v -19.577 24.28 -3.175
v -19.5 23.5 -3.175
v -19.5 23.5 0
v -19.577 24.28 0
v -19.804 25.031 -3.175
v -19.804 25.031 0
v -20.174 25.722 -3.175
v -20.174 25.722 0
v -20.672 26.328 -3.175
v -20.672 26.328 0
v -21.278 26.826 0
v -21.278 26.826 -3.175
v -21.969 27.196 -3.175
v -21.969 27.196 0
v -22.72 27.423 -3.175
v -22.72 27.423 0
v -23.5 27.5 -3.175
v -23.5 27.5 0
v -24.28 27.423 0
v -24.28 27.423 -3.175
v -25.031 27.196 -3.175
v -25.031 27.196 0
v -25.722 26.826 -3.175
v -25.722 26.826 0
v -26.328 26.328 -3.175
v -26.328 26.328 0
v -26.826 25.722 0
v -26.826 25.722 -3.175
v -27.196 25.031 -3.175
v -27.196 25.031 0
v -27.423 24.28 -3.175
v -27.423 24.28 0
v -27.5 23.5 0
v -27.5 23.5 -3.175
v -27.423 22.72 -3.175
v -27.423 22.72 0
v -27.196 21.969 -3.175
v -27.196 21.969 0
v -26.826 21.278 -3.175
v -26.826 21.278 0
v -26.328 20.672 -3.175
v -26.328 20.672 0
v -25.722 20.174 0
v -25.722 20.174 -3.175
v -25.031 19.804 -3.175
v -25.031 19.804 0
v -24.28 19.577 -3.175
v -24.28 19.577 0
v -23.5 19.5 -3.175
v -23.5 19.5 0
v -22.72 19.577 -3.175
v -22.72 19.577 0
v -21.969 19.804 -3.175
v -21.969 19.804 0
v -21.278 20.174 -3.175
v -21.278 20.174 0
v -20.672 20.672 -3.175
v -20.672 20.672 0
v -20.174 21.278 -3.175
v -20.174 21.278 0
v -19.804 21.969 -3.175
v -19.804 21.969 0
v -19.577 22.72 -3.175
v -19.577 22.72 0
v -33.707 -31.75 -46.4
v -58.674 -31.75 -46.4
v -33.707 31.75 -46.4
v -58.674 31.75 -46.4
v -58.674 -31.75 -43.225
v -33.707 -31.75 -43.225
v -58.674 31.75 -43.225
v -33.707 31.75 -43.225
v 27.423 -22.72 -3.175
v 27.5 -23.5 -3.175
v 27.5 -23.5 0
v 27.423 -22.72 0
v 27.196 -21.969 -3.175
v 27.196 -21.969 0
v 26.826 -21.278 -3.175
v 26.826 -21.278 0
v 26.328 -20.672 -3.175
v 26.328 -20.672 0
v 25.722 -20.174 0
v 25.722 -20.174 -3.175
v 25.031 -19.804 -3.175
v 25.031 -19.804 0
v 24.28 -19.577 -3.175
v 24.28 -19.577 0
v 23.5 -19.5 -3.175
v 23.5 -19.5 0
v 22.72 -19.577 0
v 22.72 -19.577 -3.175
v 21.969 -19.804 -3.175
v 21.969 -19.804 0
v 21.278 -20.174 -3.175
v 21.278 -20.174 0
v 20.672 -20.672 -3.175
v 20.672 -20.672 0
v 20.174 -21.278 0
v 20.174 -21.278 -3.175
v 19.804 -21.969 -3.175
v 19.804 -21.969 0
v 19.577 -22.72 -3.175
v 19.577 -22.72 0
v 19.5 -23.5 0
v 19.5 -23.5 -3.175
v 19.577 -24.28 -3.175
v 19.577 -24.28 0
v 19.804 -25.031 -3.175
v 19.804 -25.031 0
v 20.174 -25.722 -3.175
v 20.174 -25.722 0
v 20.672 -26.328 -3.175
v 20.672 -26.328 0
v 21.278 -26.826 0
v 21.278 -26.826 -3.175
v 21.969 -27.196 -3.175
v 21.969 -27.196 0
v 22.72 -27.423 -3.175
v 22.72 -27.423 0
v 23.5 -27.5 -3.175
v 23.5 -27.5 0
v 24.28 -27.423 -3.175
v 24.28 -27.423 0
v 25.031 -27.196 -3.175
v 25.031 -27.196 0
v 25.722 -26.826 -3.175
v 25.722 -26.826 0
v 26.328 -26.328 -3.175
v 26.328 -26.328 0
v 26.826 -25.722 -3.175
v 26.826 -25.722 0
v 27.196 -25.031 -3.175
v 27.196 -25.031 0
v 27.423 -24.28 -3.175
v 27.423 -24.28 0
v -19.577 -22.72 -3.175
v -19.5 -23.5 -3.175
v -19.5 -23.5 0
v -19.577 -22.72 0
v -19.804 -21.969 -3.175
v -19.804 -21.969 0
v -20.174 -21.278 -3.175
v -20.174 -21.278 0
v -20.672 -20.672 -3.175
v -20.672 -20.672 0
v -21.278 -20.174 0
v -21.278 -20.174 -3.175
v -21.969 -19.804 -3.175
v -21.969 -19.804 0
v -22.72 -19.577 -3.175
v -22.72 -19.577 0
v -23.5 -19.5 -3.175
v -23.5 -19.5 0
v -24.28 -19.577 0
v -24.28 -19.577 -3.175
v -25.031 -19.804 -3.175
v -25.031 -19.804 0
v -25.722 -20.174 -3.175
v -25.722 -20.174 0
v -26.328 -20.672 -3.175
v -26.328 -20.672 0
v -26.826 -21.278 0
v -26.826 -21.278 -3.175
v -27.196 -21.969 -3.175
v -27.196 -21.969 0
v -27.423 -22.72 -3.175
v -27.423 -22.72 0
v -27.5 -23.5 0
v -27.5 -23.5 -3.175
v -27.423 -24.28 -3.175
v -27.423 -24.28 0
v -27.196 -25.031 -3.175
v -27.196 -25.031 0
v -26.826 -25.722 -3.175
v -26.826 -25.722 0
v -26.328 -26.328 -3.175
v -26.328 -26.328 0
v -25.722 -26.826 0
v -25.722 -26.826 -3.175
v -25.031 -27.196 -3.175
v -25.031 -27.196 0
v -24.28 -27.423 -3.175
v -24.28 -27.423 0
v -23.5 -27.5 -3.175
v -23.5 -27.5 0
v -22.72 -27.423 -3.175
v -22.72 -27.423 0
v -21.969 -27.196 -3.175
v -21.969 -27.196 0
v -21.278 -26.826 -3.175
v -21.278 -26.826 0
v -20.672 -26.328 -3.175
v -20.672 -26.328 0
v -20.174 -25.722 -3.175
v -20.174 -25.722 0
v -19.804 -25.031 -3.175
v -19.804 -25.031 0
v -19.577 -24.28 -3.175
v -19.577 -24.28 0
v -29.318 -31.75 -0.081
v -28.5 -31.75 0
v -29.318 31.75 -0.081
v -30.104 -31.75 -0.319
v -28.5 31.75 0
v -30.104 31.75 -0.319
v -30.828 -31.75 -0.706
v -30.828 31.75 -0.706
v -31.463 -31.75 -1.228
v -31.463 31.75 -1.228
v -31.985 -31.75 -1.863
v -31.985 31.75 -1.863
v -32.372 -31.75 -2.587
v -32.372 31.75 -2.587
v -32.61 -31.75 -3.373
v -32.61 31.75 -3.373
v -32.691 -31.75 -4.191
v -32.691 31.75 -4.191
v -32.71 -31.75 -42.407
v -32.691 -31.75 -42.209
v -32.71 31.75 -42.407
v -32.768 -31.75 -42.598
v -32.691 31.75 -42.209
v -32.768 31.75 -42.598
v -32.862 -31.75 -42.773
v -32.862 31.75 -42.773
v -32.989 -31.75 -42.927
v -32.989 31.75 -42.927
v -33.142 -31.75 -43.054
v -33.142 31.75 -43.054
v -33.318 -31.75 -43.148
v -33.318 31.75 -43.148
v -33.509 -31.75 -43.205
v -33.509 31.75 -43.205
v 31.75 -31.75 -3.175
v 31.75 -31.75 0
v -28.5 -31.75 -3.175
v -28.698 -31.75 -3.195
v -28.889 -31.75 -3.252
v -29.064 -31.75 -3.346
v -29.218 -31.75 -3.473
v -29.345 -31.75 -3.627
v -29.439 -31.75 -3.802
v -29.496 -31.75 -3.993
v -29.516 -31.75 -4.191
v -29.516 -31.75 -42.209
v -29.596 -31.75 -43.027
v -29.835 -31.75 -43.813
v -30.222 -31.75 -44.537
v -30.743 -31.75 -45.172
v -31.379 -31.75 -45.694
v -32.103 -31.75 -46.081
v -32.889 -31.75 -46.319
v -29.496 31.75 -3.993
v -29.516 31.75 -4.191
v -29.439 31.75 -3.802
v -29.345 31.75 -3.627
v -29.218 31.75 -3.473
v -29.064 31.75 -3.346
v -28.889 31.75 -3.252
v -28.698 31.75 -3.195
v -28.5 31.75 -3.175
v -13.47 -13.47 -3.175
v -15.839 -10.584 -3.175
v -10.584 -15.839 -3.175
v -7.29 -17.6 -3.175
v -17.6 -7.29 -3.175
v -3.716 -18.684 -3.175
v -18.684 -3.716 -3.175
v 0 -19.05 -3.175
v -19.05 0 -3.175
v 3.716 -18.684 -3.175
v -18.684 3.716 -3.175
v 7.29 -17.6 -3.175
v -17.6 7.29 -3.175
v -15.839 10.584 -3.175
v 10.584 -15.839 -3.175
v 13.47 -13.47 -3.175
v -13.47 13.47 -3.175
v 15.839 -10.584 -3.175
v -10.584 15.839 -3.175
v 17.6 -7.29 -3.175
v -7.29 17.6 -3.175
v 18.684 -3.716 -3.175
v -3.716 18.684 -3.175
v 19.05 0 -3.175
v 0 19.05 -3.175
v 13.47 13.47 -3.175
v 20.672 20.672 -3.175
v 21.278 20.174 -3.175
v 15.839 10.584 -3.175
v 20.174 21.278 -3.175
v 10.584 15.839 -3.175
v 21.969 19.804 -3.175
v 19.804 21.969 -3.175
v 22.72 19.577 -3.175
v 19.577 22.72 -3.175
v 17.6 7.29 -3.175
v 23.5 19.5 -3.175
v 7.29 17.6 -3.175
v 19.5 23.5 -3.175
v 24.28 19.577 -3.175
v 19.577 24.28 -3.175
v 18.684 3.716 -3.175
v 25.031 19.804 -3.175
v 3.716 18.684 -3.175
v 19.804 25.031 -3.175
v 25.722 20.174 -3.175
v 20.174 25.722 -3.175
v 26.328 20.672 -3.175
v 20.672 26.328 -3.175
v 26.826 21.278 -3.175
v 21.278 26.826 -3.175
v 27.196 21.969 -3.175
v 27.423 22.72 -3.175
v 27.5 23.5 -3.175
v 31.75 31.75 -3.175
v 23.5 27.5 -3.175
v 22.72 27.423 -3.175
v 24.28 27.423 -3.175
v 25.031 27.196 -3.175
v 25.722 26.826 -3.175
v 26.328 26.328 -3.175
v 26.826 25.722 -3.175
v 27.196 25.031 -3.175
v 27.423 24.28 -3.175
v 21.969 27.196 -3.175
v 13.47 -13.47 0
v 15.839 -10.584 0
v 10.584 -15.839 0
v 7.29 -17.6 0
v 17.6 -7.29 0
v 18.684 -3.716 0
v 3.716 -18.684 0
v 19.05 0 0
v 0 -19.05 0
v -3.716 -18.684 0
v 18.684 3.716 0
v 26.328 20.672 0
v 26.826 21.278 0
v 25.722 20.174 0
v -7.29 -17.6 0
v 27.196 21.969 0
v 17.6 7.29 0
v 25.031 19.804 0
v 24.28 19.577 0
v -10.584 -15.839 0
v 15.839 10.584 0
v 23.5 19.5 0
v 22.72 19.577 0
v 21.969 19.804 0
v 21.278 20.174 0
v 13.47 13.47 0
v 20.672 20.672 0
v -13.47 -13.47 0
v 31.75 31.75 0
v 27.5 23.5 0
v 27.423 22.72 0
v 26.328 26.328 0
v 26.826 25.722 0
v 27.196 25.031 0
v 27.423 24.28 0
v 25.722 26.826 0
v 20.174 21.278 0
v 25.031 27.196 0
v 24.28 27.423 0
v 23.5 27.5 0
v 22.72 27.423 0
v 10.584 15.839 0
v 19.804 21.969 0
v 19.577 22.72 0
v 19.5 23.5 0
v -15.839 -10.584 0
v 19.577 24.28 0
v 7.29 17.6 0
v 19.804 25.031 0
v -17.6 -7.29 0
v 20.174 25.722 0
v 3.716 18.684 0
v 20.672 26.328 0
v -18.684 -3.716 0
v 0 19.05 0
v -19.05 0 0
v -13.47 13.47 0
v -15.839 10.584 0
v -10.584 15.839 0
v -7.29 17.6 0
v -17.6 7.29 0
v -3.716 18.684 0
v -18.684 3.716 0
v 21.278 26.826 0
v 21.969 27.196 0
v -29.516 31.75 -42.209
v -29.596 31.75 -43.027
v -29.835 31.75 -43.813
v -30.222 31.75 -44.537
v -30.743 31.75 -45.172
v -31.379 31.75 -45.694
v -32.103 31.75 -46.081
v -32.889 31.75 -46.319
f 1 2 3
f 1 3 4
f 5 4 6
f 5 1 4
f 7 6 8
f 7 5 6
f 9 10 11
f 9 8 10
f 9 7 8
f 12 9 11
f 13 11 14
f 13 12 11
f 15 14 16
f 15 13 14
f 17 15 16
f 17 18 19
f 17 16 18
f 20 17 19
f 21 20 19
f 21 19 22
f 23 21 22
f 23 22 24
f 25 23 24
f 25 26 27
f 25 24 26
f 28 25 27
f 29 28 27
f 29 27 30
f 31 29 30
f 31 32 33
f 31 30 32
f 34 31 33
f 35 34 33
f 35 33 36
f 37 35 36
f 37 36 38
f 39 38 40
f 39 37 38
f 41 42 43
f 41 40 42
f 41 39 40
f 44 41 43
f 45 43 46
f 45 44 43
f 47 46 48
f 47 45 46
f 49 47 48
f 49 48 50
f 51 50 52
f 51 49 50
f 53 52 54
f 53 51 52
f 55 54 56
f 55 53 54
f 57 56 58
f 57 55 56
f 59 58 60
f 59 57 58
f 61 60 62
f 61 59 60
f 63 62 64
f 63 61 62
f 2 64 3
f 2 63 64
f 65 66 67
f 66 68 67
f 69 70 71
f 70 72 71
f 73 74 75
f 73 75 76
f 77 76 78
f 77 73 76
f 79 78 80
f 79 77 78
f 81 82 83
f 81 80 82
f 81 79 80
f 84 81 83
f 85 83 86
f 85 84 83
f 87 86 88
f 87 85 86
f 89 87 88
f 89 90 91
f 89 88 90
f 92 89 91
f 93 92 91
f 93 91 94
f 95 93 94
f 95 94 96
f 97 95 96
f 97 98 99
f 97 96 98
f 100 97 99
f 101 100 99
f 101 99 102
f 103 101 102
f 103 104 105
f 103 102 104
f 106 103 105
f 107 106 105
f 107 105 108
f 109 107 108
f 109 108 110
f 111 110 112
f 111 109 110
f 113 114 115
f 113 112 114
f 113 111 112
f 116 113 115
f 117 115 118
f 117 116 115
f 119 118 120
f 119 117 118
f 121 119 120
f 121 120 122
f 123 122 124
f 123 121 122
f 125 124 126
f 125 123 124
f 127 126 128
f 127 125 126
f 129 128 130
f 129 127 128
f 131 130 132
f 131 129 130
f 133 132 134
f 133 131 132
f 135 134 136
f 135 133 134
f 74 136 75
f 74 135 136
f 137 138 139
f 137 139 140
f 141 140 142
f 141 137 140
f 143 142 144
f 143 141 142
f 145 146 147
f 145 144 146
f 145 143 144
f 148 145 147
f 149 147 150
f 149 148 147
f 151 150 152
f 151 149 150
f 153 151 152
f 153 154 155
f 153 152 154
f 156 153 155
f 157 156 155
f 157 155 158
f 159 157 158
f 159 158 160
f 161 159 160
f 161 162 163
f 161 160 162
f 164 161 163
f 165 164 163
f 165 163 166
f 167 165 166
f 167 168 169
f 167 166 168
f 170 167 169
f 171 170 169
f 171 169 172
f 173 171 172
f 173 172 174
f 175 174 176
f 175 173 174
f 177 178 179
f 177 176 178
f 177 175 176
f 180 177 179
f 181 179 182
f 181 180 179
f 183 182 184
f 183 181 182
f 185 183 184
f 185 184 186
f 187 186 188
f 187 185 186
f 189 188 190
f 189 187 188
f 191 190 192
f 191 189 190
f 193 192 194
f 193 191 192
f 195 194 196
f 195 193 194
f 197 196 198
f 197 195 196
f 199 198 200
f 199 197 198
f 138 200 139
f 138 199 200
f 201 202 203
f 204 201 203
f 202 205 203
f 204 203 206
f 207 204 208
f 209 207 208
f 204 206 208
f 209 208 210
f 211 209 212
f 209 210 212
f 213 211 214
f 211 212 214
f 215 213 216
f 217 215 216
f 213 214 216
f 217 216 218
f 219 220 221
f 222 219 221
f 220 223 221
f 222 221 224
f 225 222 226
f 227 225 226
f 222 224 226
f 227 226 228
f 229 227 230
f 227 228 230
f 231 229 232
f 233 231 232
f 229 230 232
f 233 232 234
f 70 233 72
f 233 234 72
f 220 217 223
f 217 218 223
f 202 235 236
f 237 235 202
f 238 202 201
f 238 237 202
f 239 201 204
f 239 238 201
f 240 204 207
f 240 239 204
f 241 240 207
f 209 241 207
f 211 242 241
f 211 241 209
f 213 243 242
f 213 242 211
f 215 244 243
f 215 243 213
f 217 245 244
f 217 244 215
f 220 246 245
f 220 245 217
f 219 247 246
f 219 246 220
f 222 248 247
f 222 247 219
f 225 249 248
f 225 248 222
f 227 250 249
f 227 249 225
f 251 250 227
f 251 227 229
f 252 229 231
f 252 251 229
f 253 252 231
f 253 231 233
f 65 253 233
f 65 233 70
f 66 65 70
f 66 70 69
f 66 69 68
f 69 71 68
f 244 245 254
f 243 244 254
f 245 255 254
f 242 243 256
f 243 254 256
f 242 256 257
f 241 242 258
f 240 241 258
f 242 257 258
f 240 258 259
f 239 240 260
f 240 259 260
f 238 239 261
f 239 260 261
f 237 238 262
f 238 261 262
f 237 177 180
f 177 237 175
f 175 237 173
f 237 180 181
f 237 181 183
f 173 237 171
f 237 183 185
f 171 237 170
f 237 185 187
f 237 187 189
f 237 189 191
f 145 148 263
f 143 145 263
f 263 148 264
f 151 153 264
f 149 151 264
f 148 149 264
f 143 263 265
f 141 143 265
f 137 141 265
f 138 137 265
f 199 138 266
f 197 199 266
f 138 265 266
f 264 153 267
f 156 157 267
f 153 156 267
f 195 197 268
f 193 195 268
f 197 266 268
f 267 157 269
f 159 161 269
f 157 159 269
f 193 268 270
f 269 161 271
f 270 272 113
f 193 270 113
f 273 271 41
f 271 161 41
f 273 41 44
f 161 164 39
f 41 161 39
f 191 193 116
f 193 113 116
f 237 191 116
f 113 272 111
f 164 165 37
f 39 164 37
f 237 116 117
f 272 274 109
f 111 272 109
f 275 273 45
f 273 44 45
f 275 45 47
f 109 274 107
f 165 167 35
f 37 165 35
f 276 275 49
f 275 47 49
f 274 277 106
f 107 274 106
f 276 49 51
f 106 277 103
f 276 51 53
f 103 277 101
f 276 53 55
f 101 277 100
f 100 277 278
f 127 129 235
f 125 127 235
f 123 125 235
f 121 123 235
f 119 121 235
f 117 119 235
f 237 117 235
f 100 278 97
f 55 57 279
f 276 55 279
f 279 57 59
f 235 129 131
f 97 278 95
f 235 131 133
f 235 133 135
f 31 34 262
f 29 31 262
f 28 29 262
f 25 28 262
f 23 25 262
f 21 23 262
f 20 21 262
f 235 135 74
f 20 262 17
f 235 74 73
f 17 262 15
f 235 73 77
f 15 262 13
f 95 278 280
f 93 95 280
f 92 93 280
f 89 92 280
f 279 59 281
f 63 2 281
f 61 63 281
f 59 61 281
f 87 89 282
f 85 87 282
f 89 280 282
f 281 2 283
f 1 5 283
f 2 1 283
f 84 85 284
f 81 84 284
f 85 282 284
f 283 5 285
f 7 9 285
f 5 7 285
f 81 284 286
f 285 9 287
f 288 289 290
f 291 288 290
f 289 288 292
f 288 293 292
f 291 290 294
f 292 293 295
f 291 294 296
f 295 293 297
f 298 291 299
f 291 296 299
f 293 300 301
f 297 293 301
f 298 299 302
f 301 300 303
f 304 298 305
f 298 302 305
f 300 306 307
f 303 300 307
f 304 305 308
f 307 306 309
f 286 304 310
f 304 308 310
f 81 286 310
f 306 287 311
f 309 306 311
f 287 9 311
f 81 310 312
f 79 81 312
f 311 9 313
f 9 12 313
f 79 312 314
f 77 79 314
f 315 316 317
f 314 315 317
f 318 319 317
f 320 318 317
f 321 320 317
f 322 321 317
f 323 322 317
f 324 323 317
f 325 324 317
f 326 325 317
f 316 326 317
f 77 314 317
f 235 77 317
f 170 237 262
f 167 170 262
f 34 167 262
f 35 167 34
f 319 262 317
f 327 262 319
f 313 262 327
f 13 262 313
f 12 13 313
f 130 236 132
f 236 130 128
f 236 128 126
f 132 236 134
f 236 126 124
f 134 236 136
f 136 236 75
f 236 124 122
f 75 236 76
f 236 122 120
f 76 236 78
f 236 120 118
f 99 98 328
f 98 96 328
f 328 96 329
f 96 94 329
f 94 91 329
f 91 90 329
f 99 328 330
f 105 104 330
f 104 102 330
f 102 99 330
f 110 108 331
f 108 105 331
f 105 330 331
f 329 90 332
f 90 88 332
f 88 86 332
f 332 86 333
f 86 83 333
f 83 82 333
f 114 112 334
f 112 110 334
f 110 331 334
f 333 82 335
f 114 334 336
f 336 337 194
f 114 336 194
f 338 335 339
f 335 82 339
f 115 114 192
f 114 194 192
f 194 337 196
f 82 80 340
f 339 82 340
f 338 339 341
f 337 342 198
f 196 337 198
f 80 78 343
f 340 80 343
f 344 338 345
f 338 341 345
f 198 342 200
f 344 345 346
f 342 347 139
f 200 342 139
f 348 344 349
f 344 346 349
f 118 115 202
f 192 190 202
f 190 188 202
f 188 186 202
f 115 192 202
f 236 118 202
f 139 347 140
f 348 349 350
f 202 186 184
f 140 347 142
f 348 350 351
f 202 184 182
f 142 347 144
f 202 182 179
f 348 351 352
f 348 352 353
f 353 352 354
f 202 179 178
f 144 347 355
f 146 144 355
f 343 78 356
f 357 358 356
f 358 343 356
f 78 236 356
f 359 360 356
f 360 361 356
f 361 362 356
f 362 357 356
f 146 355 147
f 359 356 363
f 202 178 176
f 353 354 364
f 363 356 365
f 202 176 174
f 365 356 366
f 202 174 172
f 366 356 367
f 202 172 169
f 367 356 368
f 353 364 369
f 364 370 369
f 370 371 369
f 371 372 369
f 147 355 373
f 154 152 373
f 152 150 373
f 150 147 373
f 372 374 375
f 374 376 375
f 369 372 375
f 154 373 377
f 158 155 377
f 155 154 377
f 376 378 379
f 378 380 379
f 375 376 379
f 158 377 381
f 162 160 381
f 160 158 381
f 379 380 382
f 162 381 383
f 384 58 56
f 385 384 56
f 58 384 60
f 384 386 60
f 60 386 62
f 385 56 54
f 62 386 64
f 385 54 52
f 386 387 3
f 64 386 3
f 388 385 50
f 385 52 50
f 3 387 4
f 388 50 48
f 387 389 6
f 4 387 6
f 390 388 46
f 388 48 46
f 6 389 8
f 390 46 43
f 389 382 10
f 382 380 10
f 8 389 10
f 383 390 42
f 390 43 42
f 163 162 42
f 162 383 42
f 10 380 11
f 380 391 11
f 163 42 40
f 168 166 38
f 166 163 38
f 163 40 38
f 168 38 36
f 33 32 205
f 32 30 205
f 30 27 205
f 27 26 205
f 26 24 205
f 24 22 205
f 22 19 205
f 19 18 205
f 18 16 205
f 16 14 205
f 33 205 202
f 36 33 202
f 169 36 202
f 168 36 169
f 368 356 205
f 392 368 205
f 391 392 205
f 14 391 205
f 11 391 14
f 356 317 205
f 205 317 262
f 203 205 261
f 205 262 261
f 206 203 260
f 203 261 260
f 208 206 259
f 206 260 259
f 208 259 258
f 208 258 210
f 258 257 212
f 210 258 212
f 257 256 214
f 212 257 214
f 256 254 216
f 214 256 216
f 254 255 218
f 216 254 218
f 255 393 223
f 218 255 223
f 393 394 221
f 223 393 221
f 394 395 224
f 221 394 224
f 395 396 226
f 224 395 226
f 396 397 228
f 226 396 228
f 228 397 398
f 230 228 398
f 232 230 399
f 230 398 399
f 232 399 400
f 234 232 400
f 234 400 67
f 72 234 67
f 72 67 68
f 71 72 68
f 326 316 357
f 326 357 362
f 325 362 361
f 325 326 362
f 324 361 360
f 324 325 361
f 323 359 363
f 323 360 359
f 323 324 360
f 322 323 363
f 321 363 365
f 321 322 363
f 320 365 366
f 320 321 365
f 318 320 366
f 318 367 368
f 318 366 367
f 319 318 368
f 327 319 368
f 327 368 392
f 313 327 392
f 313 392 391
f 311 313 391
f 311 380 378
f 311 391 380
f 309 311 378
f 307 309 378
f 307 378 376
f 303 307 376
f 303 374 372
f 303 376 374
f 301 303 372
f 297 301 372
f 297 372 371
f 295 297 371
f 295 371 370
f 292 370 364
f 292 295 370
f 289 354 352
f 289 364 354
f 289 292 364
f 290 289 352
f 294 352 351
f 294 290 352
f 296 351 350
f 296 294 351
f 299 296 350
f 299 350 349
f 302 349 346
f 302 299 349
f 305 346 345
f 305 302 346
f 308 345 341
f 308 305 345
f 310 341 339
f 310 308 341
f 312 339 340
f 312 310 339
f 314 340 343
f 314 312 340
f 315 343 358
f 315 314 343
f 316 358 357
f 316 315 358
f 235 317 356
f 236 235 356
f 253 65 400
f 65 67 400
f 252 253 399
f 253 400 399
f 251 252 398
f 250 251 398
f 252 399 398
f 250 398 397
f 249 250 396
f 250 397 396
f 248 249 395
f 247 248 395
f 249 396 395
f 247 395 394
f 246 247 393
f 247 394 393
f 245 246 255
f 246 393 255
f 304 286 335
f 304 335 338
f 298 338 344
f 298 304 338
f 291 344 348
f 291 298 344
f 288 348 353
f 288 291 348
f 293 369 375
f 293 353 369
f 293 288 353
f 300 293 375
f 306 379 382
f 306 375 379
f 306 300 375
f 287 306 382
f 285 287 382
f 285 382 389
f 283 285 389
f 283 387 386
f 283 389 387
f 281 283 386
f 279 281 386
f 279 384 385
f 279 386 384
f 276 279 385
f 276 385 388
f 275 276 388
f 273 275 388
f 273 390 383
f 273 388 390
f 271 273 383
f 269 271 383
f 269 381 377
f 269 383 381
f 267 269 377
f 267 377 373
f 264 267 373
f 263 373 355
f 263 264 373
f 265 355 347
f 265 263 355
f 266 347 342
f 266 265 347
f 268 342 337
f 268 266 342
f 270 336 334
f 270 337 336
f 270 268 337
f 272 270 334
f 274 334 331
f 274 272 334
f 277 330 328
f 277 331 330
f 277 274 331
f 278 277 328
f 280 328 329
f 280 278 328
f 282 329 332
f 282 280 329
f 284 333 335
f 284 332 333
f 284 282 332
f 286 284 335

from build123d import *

# Parameters (mm, degrees)
BOSS_EXTRUDE1_DEPTH     = 31.75
CUT_EXTRUDE1_DEPTH      = 82.262795763
CUT_EXTRUDE1_DEPTH_BACK = 82.262795763
SKETCH1_R               = 19.05
SKETCH1_R_2             = 4


with BuildPart() as part:
    # Sketch2 → Boss-Extrude1 (new, symmetric)
    with BuildSketch(Plane(origin=(0, 0, 0), x_dir=(1, 0, 0), z_dir=(0, 1, 0))):
        with BuildLine():
            Line((31.75, 0), (-28.499943, 0))
            ThreePointArc((-28.499943, 0), (-31.46342752, 1.22751548), (-32.690943, 4.191))
            Line((-32.690943, 4.191), (-32.690943, 42.208958))
            ThreePointArc((-32.690943, 42.208958), (-32.98852251, 42.92737849), (-33.706943, 43.224958))
            Line((-33.706943, 43.224958), (-58.673873, 43.224958))
            Line((-58.673873, 43.224958), (-58.673873, 46.399958))
            Line((-58.673873, 46.399958), (-33.706943, 46.399958))
            ThreePointArc((-33.706943, 46.399958), (-30.74345848, 45.17244252), (-29.515943, 42.208958))
            Line((-29.515943, 42.208958), (-29.515943, 4.191))
            ThreePointArc((-29.515943, 4.191), (-29.21836349, 3.47257951), (-28.499943, 3.175))
            Line((-28.499943, 3.175), (31.75, 3.175))
            Line((31.75, 3.175), (31.75, 0))
        make_face()
    extrude(amount=BOSS_EXTRUDE1_DEPTH, both=True)

    # Sketch1 → Cut-Extrude1 (cut, two sides: drawn at the far end of the back side and taken through both)
    with BuildSketch(Plane.XY.offset(-CUT_EXTRUDE1_DEPTH_BACK)):
        Circle(SKETCH1_R)
        with Locations((23.5, 23.5)):
            Circle(SKETCH1_R_2)
        with Locations((23.5, -23.5)):
            Circle(SKETCH1_R_2)
        with Locations((-23.5, -23.5)):
            Circle(SKETCH1_R_2)
        with Locations((-23.5, 23.5)):
            Circle(SKETCH1_R_2)
    extrude(amount=CUT_EXTRUDE1_DEPTH + CUT_EXTRUDE1_DEPTH_BACK, mode=Mode.SUBTRACT)


solid = part.part
